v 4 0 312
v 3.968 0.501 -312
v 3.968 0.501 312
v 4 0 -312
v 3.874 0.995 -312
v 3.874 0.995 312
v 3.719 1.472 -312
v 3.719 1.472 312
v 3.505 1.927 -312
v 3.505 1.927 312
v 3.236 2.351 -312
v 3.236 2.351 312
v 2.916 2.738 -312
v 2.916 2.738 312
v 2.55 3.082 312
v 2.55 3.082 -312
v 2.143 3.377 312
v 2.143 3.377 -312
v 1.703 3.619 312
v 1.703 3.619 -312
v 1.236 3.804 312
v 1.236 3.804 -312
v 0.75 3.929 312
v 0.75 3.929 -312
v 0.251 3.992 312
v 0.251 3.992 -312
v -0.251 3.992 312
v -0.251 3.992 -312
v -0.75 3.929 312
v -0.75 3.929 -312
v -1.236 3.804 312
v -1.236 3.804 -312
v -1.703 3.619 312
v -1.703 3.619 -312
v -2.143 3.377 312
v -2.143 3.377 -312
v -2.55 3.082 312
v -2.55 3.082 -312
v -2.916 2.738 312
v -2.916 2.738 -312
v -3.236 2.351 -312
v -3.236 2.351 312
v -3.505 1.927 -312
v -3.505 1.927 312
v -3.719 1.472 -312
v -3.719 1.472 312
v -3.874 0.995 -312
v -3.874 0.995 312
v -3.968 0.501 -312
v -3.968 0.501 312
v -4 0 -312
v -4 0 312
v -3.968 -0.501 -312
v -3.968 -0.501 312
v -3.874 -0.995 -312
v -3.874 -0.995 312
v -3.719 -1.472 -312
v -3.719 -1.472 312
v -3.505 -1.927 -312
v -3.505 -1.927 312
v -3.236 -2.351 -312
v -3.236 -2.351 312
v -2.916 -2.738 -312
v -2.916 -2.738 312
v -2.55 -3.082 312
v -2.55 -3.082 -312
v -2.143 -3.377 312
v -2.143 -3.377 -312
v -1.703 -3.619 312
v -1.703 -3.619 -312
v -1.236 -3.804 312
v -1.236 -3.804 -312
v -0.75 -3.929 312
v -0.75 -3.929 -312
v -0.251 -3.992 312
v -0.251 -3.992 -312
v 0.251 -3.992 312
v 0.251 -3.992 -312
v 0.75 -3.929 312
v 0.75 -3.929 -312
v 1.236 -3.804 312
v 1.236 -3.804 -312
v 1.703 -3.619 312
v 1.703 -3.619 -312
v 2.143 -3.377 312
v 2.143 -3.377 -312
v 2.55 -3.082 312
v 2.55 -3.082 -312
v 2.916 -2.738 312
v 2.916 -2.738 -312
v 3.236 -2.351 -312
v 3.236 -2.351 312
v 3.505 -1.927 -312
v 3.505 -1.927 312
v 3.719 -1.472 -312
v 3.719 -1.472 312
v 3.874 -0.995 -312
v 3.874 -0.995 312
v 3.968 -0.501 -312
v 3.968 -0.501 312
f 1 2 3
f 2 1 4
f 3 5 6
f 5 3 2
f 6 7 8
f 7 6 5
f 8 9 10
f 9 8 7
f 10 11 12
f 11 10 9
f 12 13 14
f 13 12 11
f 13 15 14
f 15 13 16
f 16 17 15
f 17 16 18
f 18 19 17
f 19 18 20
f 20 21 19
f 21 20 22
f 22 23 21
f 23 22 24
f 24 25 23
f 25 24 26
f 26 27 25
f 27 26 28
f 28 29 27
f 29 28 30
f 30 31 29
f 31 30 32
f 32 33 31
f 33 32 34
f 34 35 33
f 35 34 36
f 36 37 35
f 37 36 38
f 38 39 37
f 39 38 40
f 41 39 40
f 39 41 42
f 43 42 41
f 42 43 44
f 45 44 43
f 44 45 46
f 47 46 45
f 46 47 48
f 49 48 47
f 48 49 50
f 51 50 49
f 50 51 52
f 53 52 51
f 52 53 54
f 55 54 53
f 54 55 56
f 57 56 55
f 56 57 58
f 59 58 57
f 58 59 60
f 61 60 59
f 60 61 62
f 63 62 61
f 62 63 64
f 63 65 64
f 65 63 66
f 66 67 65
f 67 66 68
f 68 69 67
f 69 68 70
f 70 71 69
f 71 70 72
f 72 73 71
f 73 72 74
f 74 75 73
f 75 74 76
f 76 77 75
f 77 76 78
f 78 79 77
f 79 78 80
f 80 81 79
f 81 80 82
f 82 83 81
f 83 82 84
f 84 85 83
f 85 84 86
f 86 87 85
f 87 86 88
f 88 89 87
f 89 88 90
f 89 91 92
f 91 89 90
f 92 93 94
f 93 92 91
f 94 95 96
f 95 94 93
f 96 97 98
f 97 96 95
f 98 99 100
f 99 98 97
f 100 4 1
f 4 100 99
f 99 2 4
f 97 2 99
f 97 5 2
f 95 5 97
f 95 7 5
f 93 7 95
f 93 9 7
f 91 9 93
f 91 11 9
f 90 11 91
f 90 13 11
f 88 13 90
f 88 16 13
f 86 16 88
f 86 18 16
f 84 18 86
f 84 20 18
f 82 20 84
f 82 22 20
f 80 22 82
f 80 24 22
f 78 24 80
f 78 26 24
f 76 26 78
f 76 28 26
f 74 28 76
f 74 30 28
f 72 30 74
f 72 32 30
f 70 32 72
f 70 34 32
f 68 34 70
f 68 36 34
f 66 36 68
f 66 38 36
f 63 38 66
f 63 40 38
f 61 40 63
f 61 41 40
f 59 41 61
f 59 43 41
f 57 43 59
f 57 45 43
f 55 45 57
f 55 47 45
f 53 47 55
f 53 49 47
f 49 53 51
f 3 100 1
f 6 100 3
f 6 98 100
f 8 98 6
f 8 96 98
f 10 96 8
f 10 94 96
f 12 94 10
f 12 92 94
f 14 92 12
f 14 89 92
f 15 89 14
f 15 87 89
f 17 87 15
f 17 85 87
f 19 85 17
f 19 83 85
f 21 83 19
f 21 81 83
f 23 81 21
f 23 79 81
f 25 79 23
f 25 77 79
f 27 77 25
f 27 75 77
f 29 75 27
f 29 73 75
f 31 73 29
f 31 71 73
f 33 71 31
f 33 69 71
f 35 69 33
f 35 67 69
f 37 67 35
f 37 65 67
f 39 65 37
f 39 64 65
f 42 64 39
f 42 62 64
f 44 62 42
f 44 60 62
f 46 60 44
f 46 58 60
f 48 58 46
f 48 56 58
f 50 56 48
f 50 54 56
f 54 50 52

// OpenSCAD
// file: consts.scad
/*
DESCRIPTION
  Constants for SCUSU CAD model.

AUTHORS
  Saxon A. Nelson-Milton <saxon@ausocean.org>

LICENSE
  Copyright (C) 2020 the Australian Ocean Lab (AusOcean)

  It is free software: you can redistribute it and/or modify them
  under the terms of the GNU General Public License as published by the
  Free Software Foundation, either version 3 of the License, or (at your
  option) any later version.

  It is distributed in the hope that it will be useful, but WITHOUT
  ANY WARRANTY; without even the implied warranty of MERCHANTABILITY or
  FITNESS FOR A PARTICULAR PURPOSE. See the GNU General Public License
  for more details.

  You should have received a copy of the GNU General Public License
  in gpl.txt.  If not, see http://www.gnu.org/licenses.
*/

alpha = 0.5;

// Misc.
noOfFaces = 500;

$fn = noOfFaces;

// Pipe properties.
pipeLength              = 600;
pipeOuterDiameter       = 160;
pipeInternalDiameter    = 155;

// Access coupling properties.
couplingInnerDiameter = 160;
couplingOuterDiameter = couplingInnerDiameter+10;
couplingLength        = 160;

// Threaded cap properties.
capInnerDiameter    = couplingOuterDiameter;
capOuterDiameter    = 185;
capLength           = 35;

// Battery properties.
battLength = 151;
battWidth = 98;
battHeight = 93;

// Wood properties.
woodColor = [1,178/255,102/255];
woodThickness = 10;

// Battery holder end properties.
holderEndWidth = woodThickness;
holderEndDiameter = pipeInternalDiameter;

// Calculate battery displacement from center.
battDisplacement = sqrt(pow(pipeInternalDiameter/2,2)-pow(battWidth/2,2))-(battHeight/2);

// Reed switch properties.
reedSwitchLen = 40;
reedSwitchWidth = 10;
reedSwitchHeight = 10;
reedSwitchDisplacement = 30;

// Spacer properties.
spacerLegHeight = 120;
spacerLegLength = 80;
// main file
/*
DESCRIPTION
  Basic model of M8 threaded threaded rod (not yet threaded).

AUTHORS
  Saxon A. Nelson-Milton <saxon@ausocean.org>

LICENSE
  Copyright (C) 2020 the Australian Ocean Lab (AusOcean)

  It is free software: you can redistribute it and/or modify them
  under the terms of the GNU General Public License as published by the
  Free Software Foundation, either version 3 of the License, or (at your
  option) any later version.

  It is distributed in the hope that it will be useful, but WITHOUT
  ANY WARRANTY; without even the implied warranty of MERCHANTABILITY or
  FITNESS FOR A PARTICULAR PURPOSE. See the GNU General Public License
  for more details.

  You should have received a copy of the GNU General Public License
  in gpl.txt.  If not, see http://www.gnu.org/licenses.
*/

include <consts.scad>

threadedRod();

module threadedRod(){
    color([0.8,0.8,0.8]) cylinder(h=4*battLength+2*holderEndWidth,d=8,center=true,$fn=50);
}
